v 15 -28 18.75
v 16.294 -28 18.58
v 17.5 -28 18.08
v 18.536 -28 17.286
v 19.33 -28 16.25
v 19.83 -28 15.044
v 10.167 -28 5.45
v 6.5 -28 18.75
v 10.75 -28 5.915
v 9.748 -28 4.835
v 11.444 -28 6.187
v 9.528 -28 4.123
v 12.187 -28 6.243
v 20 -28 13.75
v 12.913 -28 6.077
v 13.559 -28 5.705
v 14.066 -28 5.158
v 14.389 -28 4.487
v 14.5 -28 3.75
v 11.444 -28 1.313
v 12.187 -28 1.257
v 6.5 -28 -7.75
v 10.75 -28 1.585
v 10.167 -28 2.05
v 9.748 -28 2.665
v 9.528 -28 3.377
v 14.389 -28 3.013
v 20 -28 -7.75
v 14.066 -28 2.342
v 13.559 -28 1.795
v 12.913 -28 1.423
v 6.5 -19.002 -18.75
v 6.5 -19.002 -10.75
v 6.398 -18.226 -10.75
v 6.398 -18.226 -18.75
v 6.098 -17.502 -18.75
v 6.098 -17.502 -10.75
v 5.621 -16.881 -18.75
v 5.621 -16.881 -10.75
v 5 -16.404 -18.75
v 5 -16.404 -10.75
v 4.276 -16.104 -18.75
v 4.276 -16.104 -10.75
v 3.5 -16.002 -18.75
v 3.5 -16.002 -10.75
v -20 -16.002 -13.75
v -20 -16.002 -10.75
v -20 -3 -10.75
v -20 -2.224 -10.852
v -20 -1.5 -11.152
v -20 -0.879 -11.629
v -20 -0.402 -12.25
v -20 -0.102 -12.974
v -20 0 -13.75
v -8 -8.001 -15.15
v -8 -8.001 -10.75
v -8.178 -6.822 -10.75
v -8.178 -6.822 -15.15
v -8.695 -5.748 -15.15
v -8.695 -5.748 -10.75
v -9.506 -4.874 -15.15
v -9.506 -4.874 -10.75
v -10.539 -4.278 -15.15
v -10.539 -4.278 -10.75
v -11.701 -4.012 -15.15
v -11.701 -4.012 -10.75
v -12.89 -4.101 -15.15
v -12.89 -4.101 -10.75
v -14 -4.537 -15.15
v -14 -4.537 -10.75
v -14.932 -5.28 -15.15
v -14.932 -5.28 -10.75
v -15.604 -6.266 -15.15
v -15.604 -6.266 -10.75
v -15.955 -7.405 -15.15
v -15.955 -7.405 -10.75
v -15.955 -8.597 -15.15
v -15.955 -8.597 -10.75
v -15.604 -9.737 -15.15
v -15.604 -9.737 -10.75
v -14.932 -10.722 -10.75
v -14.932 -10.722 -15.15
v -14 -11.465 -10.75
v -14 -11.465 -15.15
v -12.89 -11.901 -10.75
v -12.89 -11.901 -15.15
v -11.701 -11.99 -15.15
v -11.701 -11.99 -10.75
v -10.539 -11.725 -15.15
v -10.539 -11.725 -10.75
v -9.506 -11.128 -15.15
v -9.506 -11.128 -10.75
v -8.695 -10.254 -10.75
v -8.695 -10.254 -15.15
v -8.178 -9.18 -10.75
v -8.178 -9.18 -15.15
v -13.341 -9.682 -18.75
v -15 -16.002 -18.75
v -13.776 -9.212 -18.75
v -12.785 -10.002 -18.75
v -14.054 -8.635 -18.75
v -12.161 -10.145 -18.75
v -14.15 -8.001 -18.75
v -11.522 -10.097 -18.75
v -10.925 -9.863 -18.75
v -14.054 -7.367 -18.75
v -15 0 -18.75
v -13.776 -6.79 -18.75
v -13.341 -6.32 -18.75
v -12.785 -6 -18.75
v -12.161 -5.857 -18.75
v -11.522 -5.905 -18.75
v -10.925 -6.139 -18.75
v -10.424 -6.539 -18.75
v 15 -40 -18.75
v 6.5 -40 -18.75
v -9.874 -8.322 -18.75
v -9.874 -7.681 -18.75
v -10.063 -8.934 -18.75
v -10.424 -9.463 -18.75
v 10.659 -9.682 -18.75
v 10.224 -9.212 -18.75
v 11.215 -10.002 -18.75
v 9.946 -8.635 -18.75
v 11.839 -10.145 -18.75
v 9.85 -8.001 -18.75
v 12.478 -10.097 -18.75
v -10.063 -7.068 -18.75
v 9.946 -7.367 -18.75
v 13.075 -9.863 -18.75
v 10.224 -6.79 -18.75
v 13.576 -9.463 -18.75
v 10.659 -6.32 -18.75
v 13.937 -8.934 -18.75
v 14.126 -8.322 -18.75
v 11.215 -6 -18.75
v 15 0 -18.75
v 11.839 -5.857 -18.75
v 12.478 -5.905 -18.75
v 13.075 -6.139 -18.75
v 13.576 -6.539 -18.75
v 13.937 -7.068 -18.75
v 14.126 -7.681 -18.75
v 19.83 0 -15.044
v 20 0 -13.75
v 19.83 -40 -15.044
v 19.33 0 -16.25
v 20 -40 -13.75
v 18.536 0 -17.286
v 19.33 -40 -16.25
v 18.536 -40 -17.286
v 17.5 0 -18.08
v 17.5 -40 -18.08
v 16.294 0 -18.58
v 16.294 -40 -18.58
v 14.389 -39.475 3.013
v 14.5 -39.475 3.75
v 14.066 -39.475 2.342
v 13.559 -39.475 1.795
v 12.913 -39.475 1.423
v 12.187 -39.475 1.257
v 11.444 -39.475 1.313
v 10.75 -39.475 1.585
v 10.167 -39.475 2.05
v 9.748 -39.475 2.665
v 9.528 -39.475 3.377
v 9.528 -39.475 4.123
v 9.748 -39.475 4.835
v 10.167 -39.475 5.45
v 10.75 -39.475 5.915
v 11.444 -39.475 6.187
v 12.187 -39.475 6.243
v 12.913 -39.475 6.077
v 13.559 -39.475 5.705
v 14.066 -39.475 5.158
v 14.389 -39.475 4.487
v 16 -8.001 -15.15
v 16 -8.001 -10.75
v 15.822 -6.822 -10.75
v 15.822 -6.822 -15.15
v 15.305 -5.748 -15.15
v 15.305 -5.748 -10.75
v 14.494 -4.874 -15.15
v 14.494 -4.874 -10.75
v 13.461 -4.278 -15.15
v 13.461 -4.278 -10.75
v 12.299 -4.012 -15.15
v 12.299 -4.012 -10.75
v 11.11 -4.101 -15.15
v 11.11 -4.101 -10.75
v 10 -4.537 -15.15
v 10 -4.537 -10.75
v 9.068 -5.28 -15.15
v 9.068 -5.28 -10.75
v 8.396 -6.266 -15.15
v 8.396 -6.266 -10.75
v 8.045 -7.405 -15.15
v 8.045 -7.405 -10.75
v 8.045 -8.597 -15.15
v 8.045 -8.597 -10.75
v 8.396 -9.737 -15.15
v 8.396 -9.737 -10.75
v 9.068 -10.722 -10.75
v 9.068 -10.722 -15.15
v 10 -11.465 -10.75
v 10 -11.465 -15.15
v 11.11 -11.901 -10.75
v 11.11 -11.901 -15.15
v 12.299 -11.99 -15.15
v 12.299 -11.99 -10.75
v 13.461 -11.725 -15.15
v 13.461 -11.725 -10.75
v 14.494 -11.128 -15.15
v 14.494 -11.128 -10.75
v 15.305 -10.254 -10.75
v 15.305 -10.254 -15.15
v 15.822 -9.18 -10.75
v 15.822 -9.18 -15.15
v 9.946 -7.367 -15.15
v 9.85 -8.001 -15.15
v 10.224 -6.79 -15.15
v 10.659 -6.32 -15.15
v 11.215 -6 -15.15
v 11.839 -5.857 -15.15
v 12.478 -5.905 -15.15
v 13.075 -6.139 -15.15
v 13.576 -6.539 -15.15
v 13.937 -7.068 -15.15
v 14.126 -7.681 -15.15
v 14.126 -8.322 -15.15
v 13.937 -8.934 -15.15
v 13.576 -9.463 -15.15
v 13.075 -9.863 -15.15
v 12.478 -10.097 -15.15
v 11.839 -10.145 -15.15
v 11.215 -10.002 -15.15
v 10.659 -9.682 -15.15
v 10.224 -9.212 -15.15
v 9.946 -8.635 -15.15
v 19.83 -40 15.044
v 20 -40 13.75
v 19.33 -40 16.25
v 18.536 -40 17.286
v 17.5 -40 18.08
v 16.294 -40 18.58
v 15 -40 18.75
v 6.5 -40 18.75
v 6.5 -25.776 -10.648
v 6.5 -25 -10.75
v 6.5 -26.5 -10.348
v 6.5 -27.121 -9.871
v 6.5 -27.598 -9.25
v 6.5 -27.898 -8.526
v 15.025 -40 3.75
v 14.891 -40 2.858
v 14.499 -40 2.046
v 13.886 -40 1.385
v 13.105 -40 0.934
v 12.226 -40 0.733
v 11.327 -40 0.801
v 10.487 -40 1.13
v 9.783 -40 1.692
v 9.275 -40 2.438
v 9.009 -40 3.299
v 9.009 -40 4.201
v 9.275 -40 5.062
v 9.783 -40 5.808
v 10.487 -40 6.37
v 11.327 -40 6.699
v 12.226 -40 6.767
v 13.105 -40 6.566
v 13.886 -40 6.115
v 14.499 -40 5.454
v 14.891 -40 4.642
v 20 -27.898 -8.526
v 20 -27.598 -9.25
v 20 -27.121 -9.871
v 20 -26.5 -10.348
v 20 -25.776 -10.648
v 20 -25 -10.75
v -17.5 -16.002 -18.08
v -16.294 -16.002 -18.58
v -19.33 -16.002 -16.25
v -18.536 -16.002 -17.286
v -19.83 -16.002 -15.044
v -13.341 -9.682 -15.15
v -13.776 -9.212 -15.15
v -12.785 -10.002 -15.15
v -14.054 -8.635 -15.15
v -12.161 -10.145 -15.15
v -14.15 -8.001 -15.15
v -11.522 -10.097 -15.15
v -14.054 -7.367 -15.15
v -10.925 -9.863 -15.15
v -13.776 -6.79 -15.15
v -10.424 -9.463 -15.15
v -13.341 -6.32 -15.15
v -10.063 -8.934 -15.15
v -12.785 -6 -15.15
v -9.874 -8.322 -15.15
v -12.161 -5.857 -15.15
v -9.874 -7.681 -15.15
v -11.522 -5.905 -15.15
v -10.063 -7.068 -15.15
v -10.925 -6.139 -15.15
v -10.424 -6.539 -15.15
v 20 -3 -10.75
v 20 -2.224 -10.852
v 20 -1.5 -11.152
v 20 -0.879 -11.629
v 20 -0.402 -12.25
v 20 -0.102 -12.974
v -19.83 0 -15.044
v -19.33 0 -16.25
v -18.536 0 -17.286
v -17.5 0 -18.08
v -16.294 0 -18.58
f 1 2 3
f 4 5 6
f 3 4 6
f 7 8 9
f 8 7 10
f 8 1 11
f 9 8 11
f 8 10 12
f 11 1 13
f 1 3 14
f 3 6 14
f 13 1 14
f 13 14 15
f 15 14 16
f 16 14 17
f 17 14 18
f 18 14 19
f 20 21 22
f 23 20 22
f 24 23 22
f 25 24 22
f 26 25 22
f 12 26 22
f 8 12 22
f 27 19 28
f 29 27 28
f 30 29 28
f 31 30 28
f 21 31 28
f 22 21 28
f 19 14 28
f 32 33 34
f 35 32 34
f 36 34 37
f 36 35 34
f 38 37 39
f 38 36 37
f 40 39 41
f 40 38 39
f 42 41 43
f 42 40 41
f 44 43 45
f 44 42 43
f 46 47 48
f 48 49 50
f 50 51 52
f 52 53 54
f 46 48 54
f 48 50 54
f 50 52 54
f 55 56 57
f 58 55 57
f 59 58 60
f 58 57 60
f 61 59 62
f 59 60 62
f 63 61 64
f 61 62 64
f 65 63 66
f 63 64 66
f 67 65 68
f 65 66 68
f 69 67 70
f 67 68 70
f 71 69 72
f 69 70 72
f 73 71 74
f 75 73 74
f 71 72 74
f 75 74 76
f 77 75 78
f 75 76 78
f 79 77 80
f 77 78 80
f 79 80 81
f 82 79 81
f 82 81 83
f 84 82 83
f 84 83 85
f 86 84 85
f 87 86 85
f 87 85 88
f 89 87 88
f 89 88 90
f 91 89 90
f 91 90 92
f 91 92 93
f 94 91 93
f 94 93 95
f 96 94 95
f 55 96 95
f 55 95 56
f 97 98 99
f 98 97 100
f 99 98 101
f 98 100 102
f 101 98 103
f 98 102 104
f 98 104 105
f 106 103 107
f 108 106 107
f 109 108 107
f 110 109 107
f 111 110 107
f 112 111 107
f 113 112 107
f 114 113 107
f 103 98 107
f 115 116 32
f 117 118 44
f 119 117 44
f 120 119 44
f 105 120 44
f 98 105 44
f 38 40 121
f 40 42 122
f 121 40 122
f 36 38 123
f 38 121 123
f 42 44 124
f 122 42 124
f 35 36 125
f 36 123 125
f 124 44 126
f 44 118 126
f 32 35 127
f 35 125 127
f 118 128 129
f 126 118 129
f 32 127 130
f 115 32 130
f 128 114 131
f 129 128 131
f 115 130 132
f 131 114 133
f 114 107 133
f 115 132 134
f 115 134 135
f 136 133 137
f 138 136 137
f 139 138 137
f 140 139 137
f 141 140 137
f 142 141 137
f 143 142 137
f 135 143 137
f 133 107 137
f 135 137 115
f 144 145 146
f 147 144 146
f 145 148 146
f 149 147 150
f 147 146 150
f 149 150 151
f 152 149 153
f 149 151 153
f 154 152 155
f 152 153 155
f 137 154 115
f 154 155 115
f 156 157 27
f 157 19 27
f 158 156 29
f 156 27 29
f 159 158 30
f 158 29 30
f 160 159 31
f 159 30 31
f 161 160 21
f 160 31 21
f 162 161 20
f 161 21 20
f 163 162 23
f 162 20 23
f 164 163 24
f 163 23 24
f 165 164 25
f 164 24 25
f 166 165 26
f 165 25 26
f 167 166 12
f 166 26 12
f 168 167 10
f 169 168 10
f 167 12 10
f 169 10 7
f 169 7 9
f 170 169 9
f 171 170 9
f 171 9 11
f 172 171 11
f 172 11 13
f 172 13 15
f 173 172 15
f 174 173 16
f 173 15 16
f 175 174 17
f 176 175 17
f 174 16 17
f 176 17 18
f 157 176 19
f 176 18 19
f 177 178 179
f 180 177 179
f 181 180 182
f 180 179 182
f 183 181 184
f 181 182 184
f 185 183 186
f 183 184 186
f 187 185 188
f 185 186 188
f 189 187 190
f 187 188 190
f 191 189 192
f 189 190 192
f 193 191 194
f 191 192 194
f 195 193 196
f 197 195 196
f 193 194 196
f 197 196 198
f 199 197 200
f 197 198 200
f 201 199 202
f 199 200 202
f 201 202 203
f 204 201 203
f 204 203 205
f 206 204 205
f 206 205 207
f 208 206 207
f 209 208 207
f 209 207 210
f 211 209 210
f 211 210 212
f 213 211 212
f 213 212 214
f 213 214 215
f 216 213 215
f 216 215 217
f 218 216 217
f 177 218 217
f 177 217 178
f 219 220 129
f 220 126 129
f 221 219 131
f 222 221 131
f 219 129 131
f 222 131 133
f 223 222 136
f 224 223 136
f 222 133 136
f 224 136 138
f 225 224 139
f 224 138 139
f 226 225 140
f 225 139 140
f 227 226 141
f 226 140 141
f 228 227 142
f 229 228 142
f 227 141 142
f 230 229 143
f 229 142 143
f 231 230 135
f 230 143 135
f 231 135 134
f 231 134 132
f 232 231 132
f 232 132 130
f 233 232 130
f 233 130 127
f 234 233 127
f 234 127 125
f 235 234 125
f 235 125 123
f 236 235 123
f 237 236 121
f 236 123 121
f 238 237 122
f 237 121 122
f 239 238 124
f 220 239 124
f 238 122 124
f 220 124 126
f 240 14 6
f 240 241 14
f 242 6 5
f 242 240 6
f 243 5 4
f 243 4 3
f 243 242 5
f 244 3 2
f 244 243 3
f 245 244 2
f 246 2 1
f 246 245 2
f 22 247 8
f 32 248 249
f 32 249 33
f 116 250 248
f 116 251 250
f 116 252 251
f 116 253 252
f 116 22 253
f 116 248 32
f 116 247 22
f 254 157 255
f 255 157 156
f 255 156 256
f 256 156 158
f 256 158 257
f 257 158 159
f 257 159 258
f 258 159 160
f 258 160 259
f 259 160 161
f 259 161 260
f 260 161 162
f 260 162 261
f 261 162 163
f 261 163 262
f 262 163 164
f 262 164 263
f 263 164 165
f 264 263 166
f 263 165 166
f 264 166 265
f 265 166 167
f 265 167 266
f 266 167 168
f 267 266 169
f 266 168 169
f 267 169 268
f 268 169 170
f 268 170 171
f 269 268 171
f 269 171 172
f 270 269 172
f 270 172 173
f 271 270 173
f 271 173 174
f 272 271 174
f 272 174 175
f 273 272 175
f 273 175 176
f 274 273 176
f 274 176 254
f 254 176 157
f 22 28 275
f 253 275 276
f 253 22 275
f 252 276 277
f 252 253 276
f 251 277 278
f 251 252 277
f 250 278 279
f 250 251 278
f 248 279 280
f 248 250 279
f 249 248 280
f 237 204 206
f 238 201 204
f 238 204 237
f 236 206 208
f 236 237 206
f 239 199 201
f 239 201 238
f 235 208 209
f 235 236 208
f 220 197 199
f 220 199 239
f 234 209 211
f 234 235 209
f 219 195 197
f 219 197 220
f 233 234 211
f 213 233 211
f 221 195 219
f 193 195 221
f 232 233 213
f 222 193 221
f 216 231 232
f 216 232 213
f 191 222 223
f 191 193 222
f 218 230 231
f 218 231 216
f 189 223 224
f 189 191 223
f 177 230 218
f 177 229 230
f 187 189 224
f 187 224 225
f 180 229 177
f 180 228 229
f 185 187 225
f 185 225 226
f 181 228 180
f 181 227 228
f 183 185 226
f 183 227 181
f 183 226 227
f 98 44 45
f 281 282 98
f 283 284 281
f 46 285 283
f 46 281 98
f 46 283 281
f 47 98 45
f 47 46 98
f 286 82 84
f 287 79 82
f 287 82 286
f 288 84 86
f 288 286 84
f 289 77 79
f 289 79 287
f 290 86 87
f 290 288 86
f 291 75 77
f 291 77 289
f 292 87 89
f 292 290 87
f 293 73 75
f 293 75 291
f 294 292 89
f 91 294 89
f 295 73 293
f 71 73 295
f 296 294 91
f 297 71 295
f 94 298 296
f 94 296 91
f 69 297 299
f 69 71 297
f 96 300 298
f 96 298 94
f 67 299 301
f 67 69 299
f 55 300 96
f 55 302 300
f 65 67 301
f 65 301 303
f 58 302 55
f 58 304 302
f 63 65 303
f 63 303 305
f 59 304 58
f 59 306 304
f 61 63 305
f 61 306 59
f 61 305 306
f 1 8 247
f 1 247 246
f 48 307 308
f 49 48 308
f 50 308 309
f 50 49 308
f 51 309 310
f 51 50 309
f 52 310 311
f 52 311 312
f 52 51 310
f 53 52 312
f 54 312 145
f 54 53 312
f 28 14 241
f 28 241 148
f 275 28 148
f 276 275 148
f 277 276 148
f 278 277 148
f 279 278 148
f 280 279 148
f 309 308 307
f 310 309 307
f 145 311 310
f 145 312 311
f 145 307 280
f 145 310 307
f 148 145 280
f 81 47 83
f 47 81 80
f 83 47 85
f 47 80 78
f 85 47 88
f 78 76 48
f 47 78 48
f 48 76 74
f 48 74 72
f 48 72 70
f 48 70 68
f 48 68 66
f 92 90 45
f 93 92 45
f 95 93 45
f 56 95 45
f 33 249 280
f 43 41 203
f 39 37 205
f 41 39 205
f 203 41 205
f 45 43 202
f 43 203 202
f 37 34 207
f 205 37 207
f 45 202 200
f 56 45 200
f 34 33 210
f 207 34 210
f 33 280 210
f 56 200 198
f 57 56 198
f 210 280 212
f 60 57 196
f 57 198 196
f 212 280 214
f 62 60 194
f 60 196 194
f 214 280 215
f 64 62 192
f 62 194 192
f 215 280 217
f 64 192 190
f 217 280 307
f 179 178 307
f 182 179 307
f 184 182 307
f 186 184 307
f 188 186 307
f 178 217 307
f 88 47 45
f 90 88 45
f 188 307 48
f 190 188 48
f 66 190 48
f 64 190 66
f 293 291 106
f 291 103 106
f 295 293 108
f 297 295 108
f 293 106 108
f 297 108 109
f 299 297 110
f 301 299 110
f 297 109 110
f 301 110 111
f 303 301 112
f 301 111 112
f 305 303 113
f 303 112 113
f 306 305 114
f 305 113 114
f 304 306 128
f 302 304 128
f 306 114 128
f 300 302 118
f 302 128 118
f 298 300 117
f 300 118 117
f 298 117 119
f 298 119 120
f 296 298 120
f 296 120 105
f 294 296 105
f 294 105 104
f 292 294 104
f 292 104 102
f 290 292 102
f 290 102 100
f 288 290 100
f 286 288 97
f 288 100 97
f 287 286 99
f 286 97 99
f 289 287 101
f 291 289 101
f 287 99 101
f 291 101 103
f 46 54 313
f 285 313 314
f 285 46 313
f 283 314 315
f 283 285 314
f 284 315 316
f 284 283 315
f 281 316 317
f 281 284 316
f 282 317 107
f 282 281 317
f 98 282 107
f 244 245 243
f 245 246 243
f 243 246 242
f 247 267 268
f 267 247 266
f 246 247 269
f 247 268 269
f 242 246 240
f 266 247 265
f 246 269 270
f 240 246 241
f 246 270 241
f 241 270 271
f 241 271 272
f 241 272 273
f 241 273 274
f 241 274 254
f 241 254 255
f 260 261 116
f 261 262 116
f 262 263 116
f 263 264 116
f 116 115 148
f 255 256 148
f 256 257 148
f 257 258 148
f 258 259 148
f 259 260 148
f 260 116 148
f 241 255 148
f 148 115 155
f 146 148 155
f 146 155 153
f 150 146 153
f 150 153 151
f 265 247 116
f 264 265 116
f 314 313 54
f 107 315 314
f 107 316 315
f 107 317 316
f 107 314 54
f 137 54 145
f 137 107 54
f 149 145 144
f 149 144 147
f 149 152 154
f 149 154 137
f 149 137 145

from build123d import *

# Parameters (mm, degrees)
SKETCH1_W                                           = 40
SKETCH1_H                                           = 37.5
BOSS_EXTRUDE1_DEPTH                                 = 40
CUT_EXTRUDE1_REACH                                  = 61.595
SKETCH2_W                                           = 29.5
SKETCH2_H                                           = 28
FILLET1_R                                           = 3
M6_TAPPED_HOLE1_D                                   = 5
M6_TAPPED_HOLE1_CSINK_D                             = 6.05
M6_TAPPED_HOLE1_CSINK_ANGLE                         = 90
FILLET2_R                                           = 5
CUT_EXTRUDE2_REACH                                  = 50.493
SKETCH7_W                                           = 13
SKETCH7_H                                           = 29.5
CUT_EXTRUDE3_REACH                                  = 50.493
SKETCH8_W                                           = 29.5
SKETCH8_H                                           = 37
CUT_EXTRUDE4_REACH                                  = 61.595
SKETCH9_W                                           = 8
SKETCH9_H                                           = 23.997787144
FILLET5_R                                           = 3
CBORE_FOR_M4_HEX_SOCKET_HEAD_CAP_SCREW1_D           = 4.3
CBORE_FOR_M4_HEX_SOCKET_HEAD_CAP_SCREW1_CBORE_D     = 8
CBORE_FOR_M4_HEX_SOCKET_HEAD_CAP_SCREW1_CBORE_DEPTH = 4.4


with BuildPart() as part:
    # Sketch1 → Boss-Extrude1 (new body)
    with BuildSketch(Plane(origin=(0, 0, 0), x_dir=(1, 0, 0), z_dir=(0, 1, 0))):
        Rectangle(SKETCH1_W, SKETCH1_H)
    extrude(amount=-BOSS_EXTRUDE1_DEPTH)

    # Sketch2 → Cut-Extrude1 (cut, up to next)
    with BuildSketch(Plane(origin=(20, 0, 0), x_dir=(0, 0, -1), z_dir=(1, 0, 0)), mode=Mode.PRIVATE) as cut_extrude1_sk1:
        with Locations((-4, -14)):
            Rectangle(SKETCH2_W, SKETCH2_H)
    cut_extrude1_tool1 = extrude(cut_extrude1_sk1.sketch, amount=-CUT_EXTRUDE1_REACH, mode=Mode.PRIVATE) & part.part
    add(cut_extrude1_tool1.solids().sort_by_distance((20, -14, 4))[0], mode=Mode.SUBTRACT)

    # Fillet1
    fillet1_edges = [part.edges().sort_by_distance(p)[0] for p in [
        (0, 0, -10.75),
        (0, -28, -10.75),
    ]]
    fillet(fillet1_edges, radius=FILLET1_R)

    # M6 Tapped Hole1 (through all)
    with Locations(Plane(origin=(0, -40, 0), x_dir=(-1, 0, 0), z_dir=(0, -1, 0))):
        with Locations((-12, -3.75)):
            CounterSinkHole(M6_TAPPED_HOLE1_D / 2, M6_TAPPED_HOLE1_CSINK_D / 2, counter_sink_angle=M6_TAPPED_HOLE1_CSINK_ANGLE)

    # Fillet2
    fillet2_edges = [part.edges().sort_by_distance(p)[0] for p in [
        (20, -20, -18.75),
        (20, -34, 18.75),
        (-20, -34, 18.75),
        (-20, -20, -18.75),
    ]]
    fillet(fillet2_edges, radius=FILLET2_R)

    # Sketch7 → Cut-Extrude2 (cut, up to next)
    with BuildSketch(Plane(origin=(0, 0, 0), x_dir=(1, 0, 0), z_dir=(0, 1, 0)), mode=Mode.PRIVATE) as cut_extrude2_sk1:
        with Locations((0, -4)):
            Rectangle(SKETCH7_W, SKETCH7_H)
    cut_extrude2_tool1 = extrude(cut_extrude2_sk1.sketch, amount=-CUT_EXTRUDE2_REACH, mode=Mode.PRIVATE) & part.part
    add(cut_extrude2_tool1.solids().sort_by_distance((0, 0, 4))[0], mode=Mode.SUBTRACT)

    # Sketch8 → Cut-Extrude3 (cut, up to next)
    with BuildSketch(Plane(origin=(0, 0, 0), x_dir=(0, 0, -1), z_dir=(1, 0, 0)), mode=Mode.PRIVATE) as cut_extrude3_sk1:
        with Locations((-4, -21.5)):
            Rectangle(SKETCH8_W, SKETCH8_H)
    cut_extrude3_tool1 = extrude(cut_extrude3_sk1.sketch, amount=-CUT_EXTRUDE3_REACH, mode=Mode.PRIVATE) & part.part
    add(cut_extrude3_tool1.solids().sort_by_distance((0, -21.5, 4))[0], mode=Mode.SUBTRACT)

    # Cut-Extrude4: up to this face of the body (flat: up to its plane)
    cut_extrude4_end = Plane(part.part.faces().sort_by_distance((6.5, -33.963805531, 3.923597235))[0])
    # Sketch9 → Cut-Extrude4 (cut, up to the picked face)
    with BuildSketch(Plane.ZY.offset(20), mode=Mode.PRIVATE) as cut_extrude4_sk1:
        with Locations((-14.75, -28.001106428)):
            Rectangle(SKETCH9_W, SKETCH9_H)
    cut_extrude4_tool1 = split(extrude(cut_extrude4_sk1.sketch, amount=-CUT_EXTRUDE4_REACH, mode=Mode.PRIVATE), bisect_by=cut_extrude4_end, keep=Keep.BOTH, mode=Mode.PRIVATE)
    add(cut_extrude4_tool1.solids().sort_by(Axis((-20, -28.001106, -14.75), (1, 0, 0)))[0], mode=Mode.SUBTRACT)

    # Fillet5
    fillet5_edges = [part.edges().sort_by_distance(p)[0] for p in [
        (6.5, -16.002212856, -14.75),
    ]]
    fillet(fillet5_edges, radius=FILLET5_R)

    # CBORE for M4 Hex Socket Head Cap Screw1 (through all)
    with Locations(Plane.XY.offset(-10.75)):
        with Locations((-12, -8.001106428), (12, -8.001106428)):
            CounterBoreHole(CBORE_FOR_M4_HEX_SOCKET_HEAD_CAP_SCREW1_D / 2, CBORE_FOR_M4_HEX_SOCKET_HEAD_CAP_SCREW1_CBORE_D / 2, CBORE_FOR_M4_HEX_SOCKET_HEAD_CAP_SCREW1_CBORE_DEPTH)


solid = part.part
